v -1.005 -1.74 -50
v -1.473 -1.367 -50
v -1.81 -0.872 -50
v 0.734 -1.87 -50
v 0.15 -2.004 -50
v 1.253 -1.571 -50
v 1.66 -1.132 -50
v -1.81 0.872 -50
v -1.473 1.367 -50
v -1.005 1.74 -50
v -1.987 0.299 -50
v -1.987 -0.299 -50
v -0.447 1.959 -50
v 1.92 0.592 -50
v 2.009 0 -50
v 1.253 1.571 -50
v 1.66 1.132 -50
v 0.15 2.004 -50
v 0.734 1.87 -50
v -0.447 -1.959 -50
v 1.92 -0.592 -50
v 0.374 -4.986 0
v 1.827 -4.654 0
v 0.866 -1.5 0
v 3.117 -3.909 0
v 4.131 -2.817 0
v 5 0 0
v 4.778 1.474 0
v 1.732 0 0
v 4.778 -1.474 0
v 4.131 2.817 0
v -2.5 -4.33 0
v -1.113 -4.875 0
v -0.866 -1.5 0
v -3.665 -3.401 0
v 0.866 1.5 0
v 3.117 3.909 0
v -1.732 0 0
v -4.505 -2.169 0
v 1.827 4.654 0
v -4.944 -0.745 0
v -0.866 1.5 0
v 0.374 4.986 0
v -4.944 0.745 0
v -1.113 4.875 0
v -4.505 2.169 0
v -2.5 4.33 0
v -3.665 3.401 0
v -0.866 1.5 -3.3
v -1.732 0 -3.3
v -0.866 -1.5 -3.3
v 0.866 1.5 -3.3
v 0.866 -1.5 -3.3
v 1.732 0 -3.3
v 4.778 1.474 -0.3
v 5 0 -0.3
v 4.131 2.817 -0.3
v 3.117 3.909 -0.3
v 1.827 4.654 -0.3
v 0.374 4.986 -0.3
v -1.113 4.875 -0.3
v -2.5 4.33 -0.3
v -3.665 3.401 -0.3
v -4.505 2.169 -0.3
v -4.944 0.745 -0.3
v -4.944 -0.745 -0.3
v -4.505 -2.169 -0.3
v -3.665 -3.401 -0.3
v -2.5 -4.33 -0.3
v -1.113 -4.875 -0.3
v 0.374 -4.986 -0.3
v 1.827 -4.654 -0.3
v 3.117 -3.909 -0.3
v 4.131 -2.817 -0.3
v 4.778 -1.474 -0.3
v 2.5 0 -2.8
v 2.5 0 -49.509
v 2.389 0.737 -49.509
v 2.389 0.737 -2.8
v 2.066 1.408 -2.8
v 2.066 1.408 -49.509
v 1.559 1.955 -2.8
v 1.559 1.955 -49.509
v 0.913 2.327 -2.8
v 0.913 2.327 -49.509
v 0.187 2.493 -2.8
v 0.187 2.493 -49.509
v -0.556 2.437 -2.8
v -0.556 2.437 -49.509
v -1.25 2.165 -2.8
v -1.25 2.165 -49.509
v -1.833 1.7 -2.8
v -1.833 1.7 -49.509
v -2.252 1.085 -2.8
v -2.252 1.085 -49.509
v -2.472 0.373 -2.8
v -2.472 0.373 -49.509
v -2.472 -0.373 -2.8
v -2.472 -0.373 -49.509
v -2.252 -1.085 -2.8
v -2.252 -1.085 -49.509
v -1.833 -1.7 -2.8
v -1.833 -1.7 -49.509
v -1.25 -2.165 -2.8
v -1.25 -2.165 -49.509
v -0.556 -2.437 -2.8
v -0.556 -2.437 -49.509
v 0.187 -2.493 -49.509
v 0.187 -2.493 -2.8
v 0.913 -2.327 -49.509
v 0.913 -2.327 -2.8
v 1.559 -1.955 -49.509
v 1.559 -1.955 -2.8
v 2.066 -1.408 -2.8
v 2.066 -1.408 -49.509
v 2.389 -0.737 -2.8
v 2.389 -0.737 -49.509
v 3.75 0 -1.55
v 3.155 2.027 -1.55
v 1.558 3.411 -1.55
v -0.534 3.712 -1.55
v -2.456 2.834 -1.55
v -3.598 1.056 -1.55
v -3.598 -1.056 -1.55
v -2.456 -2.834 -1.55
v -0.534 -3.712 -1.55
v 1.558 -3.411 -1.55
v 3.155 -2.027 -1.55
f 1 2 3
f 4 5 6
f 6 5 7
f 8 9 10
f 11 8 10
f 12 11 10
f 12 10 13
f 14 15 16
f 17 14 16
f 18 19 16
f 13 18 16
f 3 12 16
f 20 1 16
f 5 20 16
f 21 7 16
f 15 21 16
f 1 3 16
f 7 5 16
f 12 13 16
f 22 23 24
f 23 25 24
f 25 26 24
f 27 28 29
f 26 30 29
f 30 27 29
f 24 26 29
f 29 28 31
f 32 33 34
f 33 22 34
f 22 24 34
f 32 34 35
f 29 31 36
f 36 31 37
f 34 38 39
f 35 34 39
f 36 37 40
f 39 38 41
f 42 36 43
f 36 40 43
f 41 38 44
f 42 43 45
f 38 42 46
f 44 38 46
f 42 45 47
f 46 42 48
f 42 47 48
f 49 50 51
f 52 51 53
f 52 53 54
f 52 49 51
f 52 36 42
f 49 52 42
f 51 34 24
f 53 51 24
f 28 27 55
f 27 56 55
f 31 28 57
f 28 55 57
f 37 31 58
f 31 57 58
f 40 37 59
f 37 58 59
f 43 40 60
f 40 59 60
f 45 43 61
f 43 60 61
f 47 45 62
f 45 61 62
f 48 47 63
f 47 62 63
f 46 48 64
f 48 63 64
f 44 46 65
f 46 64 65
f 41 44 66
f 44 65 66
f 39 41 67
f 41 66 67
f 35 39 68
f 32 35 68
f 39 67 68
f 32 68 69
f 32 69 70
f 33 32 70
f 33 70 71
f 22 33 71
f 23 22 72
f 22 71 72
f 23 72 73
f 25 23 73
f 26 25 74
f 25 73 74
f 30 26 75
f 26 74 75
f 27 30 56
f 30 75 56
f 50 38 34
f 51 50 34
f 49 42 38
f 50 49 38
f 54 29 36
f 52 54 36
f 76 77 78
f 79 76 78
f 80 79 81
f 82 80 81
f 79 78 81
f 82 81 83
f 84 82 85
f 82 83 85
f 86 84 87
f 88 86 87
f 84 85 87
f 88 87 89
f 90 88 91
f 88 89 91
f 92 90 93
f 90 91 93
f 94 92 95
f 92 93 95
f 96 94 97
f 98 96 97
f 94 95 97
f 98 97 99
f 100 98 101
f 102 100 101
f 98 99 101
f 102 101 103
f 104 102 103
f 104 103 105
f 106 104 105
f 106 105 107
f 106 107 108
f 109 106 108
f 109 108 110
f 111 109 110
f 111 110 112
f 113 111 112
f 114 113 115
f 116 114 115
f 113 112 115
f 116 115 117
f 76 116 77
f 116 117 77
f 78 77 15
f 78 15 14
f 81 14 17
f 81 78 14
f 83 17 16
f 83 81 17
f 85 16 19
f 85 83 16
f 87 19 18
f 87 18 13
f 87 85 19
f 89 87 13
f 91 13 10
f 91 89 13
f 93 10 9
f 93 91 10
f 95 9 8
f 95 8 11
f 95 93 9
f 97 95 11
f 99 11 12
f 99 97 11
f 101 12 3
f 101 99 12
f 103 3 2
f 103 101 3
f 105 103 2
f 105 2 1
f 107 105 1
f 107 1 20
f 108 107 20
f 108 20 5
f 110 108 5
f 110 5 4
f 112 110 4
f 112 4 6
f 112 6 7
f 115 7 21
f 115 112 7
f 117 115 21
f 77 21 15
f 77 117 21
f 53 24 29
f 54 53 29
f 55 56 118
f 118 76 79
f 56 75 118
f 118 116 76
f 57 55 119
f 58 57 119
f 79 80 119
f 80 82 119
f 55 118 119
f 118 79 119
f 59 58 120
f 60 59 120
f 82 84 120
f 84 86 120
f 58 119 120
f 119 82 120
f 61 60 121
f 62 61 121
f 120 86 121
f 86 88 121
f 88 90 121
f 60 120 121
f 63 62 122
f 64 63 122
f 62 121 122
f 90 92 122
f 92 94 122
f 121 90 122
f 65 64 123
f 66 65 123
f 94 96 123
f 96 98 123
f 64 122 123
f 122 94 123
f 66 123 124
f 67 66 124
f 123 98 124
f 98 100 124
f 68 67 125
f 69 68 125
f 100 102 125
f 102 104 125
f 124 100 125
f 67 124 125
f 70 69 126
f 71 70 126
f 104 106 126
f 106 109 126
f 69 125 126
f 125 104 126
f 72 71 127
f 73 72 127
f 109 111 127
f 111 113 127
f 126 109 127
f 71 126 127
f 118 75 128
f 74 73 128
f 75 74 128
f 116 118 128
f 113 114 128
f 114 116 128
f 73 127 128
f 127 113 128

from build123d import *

# Parameters (mm, degrees)
CUT_EXTRUDE1_DEPTH = 3.3
CHAMFER1_SIZE      = 0.49075


with BuildPart() as part:
    # Sketch1 → Revolve1 (revolve)
    with BuildSketch(Plane(origin=(0, 0, 0), x_dir=(1, 0, 0), z_dir=(0, 1, 0))):
        Polygon((2.5, 50), (0, 50), (0, 0), (5, 0), (5, 0.3), (2.5, 2.8), align=None)
    revolve(axis=Axis((0, 0, -50), (0, 0, 1)))

    # Sketch2 → Cut-Extrude1 (cut)
    with BuildSketch(Plane.XY):
        Polygon((-0.866025404, -1.5), (0.866025404, -1.5), (1.732050808, 0), (0.866025404, 1.5), (-0.866025404, 1.5), (-1.732050808, 0), align=None)
    extrude(amount=-CUT_EXTRUDE1_DEPTH, mode=Mode.SUBTRACT)

    # Chamfer1
    chamfer1_edges = [part.edges().sort_by_distance(p)[0] for p in [
        (-2.5, 0, -50),
    ]]
    chamfer(chamfer1_edges, length=CHAMFER1_SIZE)


solid = part.part
